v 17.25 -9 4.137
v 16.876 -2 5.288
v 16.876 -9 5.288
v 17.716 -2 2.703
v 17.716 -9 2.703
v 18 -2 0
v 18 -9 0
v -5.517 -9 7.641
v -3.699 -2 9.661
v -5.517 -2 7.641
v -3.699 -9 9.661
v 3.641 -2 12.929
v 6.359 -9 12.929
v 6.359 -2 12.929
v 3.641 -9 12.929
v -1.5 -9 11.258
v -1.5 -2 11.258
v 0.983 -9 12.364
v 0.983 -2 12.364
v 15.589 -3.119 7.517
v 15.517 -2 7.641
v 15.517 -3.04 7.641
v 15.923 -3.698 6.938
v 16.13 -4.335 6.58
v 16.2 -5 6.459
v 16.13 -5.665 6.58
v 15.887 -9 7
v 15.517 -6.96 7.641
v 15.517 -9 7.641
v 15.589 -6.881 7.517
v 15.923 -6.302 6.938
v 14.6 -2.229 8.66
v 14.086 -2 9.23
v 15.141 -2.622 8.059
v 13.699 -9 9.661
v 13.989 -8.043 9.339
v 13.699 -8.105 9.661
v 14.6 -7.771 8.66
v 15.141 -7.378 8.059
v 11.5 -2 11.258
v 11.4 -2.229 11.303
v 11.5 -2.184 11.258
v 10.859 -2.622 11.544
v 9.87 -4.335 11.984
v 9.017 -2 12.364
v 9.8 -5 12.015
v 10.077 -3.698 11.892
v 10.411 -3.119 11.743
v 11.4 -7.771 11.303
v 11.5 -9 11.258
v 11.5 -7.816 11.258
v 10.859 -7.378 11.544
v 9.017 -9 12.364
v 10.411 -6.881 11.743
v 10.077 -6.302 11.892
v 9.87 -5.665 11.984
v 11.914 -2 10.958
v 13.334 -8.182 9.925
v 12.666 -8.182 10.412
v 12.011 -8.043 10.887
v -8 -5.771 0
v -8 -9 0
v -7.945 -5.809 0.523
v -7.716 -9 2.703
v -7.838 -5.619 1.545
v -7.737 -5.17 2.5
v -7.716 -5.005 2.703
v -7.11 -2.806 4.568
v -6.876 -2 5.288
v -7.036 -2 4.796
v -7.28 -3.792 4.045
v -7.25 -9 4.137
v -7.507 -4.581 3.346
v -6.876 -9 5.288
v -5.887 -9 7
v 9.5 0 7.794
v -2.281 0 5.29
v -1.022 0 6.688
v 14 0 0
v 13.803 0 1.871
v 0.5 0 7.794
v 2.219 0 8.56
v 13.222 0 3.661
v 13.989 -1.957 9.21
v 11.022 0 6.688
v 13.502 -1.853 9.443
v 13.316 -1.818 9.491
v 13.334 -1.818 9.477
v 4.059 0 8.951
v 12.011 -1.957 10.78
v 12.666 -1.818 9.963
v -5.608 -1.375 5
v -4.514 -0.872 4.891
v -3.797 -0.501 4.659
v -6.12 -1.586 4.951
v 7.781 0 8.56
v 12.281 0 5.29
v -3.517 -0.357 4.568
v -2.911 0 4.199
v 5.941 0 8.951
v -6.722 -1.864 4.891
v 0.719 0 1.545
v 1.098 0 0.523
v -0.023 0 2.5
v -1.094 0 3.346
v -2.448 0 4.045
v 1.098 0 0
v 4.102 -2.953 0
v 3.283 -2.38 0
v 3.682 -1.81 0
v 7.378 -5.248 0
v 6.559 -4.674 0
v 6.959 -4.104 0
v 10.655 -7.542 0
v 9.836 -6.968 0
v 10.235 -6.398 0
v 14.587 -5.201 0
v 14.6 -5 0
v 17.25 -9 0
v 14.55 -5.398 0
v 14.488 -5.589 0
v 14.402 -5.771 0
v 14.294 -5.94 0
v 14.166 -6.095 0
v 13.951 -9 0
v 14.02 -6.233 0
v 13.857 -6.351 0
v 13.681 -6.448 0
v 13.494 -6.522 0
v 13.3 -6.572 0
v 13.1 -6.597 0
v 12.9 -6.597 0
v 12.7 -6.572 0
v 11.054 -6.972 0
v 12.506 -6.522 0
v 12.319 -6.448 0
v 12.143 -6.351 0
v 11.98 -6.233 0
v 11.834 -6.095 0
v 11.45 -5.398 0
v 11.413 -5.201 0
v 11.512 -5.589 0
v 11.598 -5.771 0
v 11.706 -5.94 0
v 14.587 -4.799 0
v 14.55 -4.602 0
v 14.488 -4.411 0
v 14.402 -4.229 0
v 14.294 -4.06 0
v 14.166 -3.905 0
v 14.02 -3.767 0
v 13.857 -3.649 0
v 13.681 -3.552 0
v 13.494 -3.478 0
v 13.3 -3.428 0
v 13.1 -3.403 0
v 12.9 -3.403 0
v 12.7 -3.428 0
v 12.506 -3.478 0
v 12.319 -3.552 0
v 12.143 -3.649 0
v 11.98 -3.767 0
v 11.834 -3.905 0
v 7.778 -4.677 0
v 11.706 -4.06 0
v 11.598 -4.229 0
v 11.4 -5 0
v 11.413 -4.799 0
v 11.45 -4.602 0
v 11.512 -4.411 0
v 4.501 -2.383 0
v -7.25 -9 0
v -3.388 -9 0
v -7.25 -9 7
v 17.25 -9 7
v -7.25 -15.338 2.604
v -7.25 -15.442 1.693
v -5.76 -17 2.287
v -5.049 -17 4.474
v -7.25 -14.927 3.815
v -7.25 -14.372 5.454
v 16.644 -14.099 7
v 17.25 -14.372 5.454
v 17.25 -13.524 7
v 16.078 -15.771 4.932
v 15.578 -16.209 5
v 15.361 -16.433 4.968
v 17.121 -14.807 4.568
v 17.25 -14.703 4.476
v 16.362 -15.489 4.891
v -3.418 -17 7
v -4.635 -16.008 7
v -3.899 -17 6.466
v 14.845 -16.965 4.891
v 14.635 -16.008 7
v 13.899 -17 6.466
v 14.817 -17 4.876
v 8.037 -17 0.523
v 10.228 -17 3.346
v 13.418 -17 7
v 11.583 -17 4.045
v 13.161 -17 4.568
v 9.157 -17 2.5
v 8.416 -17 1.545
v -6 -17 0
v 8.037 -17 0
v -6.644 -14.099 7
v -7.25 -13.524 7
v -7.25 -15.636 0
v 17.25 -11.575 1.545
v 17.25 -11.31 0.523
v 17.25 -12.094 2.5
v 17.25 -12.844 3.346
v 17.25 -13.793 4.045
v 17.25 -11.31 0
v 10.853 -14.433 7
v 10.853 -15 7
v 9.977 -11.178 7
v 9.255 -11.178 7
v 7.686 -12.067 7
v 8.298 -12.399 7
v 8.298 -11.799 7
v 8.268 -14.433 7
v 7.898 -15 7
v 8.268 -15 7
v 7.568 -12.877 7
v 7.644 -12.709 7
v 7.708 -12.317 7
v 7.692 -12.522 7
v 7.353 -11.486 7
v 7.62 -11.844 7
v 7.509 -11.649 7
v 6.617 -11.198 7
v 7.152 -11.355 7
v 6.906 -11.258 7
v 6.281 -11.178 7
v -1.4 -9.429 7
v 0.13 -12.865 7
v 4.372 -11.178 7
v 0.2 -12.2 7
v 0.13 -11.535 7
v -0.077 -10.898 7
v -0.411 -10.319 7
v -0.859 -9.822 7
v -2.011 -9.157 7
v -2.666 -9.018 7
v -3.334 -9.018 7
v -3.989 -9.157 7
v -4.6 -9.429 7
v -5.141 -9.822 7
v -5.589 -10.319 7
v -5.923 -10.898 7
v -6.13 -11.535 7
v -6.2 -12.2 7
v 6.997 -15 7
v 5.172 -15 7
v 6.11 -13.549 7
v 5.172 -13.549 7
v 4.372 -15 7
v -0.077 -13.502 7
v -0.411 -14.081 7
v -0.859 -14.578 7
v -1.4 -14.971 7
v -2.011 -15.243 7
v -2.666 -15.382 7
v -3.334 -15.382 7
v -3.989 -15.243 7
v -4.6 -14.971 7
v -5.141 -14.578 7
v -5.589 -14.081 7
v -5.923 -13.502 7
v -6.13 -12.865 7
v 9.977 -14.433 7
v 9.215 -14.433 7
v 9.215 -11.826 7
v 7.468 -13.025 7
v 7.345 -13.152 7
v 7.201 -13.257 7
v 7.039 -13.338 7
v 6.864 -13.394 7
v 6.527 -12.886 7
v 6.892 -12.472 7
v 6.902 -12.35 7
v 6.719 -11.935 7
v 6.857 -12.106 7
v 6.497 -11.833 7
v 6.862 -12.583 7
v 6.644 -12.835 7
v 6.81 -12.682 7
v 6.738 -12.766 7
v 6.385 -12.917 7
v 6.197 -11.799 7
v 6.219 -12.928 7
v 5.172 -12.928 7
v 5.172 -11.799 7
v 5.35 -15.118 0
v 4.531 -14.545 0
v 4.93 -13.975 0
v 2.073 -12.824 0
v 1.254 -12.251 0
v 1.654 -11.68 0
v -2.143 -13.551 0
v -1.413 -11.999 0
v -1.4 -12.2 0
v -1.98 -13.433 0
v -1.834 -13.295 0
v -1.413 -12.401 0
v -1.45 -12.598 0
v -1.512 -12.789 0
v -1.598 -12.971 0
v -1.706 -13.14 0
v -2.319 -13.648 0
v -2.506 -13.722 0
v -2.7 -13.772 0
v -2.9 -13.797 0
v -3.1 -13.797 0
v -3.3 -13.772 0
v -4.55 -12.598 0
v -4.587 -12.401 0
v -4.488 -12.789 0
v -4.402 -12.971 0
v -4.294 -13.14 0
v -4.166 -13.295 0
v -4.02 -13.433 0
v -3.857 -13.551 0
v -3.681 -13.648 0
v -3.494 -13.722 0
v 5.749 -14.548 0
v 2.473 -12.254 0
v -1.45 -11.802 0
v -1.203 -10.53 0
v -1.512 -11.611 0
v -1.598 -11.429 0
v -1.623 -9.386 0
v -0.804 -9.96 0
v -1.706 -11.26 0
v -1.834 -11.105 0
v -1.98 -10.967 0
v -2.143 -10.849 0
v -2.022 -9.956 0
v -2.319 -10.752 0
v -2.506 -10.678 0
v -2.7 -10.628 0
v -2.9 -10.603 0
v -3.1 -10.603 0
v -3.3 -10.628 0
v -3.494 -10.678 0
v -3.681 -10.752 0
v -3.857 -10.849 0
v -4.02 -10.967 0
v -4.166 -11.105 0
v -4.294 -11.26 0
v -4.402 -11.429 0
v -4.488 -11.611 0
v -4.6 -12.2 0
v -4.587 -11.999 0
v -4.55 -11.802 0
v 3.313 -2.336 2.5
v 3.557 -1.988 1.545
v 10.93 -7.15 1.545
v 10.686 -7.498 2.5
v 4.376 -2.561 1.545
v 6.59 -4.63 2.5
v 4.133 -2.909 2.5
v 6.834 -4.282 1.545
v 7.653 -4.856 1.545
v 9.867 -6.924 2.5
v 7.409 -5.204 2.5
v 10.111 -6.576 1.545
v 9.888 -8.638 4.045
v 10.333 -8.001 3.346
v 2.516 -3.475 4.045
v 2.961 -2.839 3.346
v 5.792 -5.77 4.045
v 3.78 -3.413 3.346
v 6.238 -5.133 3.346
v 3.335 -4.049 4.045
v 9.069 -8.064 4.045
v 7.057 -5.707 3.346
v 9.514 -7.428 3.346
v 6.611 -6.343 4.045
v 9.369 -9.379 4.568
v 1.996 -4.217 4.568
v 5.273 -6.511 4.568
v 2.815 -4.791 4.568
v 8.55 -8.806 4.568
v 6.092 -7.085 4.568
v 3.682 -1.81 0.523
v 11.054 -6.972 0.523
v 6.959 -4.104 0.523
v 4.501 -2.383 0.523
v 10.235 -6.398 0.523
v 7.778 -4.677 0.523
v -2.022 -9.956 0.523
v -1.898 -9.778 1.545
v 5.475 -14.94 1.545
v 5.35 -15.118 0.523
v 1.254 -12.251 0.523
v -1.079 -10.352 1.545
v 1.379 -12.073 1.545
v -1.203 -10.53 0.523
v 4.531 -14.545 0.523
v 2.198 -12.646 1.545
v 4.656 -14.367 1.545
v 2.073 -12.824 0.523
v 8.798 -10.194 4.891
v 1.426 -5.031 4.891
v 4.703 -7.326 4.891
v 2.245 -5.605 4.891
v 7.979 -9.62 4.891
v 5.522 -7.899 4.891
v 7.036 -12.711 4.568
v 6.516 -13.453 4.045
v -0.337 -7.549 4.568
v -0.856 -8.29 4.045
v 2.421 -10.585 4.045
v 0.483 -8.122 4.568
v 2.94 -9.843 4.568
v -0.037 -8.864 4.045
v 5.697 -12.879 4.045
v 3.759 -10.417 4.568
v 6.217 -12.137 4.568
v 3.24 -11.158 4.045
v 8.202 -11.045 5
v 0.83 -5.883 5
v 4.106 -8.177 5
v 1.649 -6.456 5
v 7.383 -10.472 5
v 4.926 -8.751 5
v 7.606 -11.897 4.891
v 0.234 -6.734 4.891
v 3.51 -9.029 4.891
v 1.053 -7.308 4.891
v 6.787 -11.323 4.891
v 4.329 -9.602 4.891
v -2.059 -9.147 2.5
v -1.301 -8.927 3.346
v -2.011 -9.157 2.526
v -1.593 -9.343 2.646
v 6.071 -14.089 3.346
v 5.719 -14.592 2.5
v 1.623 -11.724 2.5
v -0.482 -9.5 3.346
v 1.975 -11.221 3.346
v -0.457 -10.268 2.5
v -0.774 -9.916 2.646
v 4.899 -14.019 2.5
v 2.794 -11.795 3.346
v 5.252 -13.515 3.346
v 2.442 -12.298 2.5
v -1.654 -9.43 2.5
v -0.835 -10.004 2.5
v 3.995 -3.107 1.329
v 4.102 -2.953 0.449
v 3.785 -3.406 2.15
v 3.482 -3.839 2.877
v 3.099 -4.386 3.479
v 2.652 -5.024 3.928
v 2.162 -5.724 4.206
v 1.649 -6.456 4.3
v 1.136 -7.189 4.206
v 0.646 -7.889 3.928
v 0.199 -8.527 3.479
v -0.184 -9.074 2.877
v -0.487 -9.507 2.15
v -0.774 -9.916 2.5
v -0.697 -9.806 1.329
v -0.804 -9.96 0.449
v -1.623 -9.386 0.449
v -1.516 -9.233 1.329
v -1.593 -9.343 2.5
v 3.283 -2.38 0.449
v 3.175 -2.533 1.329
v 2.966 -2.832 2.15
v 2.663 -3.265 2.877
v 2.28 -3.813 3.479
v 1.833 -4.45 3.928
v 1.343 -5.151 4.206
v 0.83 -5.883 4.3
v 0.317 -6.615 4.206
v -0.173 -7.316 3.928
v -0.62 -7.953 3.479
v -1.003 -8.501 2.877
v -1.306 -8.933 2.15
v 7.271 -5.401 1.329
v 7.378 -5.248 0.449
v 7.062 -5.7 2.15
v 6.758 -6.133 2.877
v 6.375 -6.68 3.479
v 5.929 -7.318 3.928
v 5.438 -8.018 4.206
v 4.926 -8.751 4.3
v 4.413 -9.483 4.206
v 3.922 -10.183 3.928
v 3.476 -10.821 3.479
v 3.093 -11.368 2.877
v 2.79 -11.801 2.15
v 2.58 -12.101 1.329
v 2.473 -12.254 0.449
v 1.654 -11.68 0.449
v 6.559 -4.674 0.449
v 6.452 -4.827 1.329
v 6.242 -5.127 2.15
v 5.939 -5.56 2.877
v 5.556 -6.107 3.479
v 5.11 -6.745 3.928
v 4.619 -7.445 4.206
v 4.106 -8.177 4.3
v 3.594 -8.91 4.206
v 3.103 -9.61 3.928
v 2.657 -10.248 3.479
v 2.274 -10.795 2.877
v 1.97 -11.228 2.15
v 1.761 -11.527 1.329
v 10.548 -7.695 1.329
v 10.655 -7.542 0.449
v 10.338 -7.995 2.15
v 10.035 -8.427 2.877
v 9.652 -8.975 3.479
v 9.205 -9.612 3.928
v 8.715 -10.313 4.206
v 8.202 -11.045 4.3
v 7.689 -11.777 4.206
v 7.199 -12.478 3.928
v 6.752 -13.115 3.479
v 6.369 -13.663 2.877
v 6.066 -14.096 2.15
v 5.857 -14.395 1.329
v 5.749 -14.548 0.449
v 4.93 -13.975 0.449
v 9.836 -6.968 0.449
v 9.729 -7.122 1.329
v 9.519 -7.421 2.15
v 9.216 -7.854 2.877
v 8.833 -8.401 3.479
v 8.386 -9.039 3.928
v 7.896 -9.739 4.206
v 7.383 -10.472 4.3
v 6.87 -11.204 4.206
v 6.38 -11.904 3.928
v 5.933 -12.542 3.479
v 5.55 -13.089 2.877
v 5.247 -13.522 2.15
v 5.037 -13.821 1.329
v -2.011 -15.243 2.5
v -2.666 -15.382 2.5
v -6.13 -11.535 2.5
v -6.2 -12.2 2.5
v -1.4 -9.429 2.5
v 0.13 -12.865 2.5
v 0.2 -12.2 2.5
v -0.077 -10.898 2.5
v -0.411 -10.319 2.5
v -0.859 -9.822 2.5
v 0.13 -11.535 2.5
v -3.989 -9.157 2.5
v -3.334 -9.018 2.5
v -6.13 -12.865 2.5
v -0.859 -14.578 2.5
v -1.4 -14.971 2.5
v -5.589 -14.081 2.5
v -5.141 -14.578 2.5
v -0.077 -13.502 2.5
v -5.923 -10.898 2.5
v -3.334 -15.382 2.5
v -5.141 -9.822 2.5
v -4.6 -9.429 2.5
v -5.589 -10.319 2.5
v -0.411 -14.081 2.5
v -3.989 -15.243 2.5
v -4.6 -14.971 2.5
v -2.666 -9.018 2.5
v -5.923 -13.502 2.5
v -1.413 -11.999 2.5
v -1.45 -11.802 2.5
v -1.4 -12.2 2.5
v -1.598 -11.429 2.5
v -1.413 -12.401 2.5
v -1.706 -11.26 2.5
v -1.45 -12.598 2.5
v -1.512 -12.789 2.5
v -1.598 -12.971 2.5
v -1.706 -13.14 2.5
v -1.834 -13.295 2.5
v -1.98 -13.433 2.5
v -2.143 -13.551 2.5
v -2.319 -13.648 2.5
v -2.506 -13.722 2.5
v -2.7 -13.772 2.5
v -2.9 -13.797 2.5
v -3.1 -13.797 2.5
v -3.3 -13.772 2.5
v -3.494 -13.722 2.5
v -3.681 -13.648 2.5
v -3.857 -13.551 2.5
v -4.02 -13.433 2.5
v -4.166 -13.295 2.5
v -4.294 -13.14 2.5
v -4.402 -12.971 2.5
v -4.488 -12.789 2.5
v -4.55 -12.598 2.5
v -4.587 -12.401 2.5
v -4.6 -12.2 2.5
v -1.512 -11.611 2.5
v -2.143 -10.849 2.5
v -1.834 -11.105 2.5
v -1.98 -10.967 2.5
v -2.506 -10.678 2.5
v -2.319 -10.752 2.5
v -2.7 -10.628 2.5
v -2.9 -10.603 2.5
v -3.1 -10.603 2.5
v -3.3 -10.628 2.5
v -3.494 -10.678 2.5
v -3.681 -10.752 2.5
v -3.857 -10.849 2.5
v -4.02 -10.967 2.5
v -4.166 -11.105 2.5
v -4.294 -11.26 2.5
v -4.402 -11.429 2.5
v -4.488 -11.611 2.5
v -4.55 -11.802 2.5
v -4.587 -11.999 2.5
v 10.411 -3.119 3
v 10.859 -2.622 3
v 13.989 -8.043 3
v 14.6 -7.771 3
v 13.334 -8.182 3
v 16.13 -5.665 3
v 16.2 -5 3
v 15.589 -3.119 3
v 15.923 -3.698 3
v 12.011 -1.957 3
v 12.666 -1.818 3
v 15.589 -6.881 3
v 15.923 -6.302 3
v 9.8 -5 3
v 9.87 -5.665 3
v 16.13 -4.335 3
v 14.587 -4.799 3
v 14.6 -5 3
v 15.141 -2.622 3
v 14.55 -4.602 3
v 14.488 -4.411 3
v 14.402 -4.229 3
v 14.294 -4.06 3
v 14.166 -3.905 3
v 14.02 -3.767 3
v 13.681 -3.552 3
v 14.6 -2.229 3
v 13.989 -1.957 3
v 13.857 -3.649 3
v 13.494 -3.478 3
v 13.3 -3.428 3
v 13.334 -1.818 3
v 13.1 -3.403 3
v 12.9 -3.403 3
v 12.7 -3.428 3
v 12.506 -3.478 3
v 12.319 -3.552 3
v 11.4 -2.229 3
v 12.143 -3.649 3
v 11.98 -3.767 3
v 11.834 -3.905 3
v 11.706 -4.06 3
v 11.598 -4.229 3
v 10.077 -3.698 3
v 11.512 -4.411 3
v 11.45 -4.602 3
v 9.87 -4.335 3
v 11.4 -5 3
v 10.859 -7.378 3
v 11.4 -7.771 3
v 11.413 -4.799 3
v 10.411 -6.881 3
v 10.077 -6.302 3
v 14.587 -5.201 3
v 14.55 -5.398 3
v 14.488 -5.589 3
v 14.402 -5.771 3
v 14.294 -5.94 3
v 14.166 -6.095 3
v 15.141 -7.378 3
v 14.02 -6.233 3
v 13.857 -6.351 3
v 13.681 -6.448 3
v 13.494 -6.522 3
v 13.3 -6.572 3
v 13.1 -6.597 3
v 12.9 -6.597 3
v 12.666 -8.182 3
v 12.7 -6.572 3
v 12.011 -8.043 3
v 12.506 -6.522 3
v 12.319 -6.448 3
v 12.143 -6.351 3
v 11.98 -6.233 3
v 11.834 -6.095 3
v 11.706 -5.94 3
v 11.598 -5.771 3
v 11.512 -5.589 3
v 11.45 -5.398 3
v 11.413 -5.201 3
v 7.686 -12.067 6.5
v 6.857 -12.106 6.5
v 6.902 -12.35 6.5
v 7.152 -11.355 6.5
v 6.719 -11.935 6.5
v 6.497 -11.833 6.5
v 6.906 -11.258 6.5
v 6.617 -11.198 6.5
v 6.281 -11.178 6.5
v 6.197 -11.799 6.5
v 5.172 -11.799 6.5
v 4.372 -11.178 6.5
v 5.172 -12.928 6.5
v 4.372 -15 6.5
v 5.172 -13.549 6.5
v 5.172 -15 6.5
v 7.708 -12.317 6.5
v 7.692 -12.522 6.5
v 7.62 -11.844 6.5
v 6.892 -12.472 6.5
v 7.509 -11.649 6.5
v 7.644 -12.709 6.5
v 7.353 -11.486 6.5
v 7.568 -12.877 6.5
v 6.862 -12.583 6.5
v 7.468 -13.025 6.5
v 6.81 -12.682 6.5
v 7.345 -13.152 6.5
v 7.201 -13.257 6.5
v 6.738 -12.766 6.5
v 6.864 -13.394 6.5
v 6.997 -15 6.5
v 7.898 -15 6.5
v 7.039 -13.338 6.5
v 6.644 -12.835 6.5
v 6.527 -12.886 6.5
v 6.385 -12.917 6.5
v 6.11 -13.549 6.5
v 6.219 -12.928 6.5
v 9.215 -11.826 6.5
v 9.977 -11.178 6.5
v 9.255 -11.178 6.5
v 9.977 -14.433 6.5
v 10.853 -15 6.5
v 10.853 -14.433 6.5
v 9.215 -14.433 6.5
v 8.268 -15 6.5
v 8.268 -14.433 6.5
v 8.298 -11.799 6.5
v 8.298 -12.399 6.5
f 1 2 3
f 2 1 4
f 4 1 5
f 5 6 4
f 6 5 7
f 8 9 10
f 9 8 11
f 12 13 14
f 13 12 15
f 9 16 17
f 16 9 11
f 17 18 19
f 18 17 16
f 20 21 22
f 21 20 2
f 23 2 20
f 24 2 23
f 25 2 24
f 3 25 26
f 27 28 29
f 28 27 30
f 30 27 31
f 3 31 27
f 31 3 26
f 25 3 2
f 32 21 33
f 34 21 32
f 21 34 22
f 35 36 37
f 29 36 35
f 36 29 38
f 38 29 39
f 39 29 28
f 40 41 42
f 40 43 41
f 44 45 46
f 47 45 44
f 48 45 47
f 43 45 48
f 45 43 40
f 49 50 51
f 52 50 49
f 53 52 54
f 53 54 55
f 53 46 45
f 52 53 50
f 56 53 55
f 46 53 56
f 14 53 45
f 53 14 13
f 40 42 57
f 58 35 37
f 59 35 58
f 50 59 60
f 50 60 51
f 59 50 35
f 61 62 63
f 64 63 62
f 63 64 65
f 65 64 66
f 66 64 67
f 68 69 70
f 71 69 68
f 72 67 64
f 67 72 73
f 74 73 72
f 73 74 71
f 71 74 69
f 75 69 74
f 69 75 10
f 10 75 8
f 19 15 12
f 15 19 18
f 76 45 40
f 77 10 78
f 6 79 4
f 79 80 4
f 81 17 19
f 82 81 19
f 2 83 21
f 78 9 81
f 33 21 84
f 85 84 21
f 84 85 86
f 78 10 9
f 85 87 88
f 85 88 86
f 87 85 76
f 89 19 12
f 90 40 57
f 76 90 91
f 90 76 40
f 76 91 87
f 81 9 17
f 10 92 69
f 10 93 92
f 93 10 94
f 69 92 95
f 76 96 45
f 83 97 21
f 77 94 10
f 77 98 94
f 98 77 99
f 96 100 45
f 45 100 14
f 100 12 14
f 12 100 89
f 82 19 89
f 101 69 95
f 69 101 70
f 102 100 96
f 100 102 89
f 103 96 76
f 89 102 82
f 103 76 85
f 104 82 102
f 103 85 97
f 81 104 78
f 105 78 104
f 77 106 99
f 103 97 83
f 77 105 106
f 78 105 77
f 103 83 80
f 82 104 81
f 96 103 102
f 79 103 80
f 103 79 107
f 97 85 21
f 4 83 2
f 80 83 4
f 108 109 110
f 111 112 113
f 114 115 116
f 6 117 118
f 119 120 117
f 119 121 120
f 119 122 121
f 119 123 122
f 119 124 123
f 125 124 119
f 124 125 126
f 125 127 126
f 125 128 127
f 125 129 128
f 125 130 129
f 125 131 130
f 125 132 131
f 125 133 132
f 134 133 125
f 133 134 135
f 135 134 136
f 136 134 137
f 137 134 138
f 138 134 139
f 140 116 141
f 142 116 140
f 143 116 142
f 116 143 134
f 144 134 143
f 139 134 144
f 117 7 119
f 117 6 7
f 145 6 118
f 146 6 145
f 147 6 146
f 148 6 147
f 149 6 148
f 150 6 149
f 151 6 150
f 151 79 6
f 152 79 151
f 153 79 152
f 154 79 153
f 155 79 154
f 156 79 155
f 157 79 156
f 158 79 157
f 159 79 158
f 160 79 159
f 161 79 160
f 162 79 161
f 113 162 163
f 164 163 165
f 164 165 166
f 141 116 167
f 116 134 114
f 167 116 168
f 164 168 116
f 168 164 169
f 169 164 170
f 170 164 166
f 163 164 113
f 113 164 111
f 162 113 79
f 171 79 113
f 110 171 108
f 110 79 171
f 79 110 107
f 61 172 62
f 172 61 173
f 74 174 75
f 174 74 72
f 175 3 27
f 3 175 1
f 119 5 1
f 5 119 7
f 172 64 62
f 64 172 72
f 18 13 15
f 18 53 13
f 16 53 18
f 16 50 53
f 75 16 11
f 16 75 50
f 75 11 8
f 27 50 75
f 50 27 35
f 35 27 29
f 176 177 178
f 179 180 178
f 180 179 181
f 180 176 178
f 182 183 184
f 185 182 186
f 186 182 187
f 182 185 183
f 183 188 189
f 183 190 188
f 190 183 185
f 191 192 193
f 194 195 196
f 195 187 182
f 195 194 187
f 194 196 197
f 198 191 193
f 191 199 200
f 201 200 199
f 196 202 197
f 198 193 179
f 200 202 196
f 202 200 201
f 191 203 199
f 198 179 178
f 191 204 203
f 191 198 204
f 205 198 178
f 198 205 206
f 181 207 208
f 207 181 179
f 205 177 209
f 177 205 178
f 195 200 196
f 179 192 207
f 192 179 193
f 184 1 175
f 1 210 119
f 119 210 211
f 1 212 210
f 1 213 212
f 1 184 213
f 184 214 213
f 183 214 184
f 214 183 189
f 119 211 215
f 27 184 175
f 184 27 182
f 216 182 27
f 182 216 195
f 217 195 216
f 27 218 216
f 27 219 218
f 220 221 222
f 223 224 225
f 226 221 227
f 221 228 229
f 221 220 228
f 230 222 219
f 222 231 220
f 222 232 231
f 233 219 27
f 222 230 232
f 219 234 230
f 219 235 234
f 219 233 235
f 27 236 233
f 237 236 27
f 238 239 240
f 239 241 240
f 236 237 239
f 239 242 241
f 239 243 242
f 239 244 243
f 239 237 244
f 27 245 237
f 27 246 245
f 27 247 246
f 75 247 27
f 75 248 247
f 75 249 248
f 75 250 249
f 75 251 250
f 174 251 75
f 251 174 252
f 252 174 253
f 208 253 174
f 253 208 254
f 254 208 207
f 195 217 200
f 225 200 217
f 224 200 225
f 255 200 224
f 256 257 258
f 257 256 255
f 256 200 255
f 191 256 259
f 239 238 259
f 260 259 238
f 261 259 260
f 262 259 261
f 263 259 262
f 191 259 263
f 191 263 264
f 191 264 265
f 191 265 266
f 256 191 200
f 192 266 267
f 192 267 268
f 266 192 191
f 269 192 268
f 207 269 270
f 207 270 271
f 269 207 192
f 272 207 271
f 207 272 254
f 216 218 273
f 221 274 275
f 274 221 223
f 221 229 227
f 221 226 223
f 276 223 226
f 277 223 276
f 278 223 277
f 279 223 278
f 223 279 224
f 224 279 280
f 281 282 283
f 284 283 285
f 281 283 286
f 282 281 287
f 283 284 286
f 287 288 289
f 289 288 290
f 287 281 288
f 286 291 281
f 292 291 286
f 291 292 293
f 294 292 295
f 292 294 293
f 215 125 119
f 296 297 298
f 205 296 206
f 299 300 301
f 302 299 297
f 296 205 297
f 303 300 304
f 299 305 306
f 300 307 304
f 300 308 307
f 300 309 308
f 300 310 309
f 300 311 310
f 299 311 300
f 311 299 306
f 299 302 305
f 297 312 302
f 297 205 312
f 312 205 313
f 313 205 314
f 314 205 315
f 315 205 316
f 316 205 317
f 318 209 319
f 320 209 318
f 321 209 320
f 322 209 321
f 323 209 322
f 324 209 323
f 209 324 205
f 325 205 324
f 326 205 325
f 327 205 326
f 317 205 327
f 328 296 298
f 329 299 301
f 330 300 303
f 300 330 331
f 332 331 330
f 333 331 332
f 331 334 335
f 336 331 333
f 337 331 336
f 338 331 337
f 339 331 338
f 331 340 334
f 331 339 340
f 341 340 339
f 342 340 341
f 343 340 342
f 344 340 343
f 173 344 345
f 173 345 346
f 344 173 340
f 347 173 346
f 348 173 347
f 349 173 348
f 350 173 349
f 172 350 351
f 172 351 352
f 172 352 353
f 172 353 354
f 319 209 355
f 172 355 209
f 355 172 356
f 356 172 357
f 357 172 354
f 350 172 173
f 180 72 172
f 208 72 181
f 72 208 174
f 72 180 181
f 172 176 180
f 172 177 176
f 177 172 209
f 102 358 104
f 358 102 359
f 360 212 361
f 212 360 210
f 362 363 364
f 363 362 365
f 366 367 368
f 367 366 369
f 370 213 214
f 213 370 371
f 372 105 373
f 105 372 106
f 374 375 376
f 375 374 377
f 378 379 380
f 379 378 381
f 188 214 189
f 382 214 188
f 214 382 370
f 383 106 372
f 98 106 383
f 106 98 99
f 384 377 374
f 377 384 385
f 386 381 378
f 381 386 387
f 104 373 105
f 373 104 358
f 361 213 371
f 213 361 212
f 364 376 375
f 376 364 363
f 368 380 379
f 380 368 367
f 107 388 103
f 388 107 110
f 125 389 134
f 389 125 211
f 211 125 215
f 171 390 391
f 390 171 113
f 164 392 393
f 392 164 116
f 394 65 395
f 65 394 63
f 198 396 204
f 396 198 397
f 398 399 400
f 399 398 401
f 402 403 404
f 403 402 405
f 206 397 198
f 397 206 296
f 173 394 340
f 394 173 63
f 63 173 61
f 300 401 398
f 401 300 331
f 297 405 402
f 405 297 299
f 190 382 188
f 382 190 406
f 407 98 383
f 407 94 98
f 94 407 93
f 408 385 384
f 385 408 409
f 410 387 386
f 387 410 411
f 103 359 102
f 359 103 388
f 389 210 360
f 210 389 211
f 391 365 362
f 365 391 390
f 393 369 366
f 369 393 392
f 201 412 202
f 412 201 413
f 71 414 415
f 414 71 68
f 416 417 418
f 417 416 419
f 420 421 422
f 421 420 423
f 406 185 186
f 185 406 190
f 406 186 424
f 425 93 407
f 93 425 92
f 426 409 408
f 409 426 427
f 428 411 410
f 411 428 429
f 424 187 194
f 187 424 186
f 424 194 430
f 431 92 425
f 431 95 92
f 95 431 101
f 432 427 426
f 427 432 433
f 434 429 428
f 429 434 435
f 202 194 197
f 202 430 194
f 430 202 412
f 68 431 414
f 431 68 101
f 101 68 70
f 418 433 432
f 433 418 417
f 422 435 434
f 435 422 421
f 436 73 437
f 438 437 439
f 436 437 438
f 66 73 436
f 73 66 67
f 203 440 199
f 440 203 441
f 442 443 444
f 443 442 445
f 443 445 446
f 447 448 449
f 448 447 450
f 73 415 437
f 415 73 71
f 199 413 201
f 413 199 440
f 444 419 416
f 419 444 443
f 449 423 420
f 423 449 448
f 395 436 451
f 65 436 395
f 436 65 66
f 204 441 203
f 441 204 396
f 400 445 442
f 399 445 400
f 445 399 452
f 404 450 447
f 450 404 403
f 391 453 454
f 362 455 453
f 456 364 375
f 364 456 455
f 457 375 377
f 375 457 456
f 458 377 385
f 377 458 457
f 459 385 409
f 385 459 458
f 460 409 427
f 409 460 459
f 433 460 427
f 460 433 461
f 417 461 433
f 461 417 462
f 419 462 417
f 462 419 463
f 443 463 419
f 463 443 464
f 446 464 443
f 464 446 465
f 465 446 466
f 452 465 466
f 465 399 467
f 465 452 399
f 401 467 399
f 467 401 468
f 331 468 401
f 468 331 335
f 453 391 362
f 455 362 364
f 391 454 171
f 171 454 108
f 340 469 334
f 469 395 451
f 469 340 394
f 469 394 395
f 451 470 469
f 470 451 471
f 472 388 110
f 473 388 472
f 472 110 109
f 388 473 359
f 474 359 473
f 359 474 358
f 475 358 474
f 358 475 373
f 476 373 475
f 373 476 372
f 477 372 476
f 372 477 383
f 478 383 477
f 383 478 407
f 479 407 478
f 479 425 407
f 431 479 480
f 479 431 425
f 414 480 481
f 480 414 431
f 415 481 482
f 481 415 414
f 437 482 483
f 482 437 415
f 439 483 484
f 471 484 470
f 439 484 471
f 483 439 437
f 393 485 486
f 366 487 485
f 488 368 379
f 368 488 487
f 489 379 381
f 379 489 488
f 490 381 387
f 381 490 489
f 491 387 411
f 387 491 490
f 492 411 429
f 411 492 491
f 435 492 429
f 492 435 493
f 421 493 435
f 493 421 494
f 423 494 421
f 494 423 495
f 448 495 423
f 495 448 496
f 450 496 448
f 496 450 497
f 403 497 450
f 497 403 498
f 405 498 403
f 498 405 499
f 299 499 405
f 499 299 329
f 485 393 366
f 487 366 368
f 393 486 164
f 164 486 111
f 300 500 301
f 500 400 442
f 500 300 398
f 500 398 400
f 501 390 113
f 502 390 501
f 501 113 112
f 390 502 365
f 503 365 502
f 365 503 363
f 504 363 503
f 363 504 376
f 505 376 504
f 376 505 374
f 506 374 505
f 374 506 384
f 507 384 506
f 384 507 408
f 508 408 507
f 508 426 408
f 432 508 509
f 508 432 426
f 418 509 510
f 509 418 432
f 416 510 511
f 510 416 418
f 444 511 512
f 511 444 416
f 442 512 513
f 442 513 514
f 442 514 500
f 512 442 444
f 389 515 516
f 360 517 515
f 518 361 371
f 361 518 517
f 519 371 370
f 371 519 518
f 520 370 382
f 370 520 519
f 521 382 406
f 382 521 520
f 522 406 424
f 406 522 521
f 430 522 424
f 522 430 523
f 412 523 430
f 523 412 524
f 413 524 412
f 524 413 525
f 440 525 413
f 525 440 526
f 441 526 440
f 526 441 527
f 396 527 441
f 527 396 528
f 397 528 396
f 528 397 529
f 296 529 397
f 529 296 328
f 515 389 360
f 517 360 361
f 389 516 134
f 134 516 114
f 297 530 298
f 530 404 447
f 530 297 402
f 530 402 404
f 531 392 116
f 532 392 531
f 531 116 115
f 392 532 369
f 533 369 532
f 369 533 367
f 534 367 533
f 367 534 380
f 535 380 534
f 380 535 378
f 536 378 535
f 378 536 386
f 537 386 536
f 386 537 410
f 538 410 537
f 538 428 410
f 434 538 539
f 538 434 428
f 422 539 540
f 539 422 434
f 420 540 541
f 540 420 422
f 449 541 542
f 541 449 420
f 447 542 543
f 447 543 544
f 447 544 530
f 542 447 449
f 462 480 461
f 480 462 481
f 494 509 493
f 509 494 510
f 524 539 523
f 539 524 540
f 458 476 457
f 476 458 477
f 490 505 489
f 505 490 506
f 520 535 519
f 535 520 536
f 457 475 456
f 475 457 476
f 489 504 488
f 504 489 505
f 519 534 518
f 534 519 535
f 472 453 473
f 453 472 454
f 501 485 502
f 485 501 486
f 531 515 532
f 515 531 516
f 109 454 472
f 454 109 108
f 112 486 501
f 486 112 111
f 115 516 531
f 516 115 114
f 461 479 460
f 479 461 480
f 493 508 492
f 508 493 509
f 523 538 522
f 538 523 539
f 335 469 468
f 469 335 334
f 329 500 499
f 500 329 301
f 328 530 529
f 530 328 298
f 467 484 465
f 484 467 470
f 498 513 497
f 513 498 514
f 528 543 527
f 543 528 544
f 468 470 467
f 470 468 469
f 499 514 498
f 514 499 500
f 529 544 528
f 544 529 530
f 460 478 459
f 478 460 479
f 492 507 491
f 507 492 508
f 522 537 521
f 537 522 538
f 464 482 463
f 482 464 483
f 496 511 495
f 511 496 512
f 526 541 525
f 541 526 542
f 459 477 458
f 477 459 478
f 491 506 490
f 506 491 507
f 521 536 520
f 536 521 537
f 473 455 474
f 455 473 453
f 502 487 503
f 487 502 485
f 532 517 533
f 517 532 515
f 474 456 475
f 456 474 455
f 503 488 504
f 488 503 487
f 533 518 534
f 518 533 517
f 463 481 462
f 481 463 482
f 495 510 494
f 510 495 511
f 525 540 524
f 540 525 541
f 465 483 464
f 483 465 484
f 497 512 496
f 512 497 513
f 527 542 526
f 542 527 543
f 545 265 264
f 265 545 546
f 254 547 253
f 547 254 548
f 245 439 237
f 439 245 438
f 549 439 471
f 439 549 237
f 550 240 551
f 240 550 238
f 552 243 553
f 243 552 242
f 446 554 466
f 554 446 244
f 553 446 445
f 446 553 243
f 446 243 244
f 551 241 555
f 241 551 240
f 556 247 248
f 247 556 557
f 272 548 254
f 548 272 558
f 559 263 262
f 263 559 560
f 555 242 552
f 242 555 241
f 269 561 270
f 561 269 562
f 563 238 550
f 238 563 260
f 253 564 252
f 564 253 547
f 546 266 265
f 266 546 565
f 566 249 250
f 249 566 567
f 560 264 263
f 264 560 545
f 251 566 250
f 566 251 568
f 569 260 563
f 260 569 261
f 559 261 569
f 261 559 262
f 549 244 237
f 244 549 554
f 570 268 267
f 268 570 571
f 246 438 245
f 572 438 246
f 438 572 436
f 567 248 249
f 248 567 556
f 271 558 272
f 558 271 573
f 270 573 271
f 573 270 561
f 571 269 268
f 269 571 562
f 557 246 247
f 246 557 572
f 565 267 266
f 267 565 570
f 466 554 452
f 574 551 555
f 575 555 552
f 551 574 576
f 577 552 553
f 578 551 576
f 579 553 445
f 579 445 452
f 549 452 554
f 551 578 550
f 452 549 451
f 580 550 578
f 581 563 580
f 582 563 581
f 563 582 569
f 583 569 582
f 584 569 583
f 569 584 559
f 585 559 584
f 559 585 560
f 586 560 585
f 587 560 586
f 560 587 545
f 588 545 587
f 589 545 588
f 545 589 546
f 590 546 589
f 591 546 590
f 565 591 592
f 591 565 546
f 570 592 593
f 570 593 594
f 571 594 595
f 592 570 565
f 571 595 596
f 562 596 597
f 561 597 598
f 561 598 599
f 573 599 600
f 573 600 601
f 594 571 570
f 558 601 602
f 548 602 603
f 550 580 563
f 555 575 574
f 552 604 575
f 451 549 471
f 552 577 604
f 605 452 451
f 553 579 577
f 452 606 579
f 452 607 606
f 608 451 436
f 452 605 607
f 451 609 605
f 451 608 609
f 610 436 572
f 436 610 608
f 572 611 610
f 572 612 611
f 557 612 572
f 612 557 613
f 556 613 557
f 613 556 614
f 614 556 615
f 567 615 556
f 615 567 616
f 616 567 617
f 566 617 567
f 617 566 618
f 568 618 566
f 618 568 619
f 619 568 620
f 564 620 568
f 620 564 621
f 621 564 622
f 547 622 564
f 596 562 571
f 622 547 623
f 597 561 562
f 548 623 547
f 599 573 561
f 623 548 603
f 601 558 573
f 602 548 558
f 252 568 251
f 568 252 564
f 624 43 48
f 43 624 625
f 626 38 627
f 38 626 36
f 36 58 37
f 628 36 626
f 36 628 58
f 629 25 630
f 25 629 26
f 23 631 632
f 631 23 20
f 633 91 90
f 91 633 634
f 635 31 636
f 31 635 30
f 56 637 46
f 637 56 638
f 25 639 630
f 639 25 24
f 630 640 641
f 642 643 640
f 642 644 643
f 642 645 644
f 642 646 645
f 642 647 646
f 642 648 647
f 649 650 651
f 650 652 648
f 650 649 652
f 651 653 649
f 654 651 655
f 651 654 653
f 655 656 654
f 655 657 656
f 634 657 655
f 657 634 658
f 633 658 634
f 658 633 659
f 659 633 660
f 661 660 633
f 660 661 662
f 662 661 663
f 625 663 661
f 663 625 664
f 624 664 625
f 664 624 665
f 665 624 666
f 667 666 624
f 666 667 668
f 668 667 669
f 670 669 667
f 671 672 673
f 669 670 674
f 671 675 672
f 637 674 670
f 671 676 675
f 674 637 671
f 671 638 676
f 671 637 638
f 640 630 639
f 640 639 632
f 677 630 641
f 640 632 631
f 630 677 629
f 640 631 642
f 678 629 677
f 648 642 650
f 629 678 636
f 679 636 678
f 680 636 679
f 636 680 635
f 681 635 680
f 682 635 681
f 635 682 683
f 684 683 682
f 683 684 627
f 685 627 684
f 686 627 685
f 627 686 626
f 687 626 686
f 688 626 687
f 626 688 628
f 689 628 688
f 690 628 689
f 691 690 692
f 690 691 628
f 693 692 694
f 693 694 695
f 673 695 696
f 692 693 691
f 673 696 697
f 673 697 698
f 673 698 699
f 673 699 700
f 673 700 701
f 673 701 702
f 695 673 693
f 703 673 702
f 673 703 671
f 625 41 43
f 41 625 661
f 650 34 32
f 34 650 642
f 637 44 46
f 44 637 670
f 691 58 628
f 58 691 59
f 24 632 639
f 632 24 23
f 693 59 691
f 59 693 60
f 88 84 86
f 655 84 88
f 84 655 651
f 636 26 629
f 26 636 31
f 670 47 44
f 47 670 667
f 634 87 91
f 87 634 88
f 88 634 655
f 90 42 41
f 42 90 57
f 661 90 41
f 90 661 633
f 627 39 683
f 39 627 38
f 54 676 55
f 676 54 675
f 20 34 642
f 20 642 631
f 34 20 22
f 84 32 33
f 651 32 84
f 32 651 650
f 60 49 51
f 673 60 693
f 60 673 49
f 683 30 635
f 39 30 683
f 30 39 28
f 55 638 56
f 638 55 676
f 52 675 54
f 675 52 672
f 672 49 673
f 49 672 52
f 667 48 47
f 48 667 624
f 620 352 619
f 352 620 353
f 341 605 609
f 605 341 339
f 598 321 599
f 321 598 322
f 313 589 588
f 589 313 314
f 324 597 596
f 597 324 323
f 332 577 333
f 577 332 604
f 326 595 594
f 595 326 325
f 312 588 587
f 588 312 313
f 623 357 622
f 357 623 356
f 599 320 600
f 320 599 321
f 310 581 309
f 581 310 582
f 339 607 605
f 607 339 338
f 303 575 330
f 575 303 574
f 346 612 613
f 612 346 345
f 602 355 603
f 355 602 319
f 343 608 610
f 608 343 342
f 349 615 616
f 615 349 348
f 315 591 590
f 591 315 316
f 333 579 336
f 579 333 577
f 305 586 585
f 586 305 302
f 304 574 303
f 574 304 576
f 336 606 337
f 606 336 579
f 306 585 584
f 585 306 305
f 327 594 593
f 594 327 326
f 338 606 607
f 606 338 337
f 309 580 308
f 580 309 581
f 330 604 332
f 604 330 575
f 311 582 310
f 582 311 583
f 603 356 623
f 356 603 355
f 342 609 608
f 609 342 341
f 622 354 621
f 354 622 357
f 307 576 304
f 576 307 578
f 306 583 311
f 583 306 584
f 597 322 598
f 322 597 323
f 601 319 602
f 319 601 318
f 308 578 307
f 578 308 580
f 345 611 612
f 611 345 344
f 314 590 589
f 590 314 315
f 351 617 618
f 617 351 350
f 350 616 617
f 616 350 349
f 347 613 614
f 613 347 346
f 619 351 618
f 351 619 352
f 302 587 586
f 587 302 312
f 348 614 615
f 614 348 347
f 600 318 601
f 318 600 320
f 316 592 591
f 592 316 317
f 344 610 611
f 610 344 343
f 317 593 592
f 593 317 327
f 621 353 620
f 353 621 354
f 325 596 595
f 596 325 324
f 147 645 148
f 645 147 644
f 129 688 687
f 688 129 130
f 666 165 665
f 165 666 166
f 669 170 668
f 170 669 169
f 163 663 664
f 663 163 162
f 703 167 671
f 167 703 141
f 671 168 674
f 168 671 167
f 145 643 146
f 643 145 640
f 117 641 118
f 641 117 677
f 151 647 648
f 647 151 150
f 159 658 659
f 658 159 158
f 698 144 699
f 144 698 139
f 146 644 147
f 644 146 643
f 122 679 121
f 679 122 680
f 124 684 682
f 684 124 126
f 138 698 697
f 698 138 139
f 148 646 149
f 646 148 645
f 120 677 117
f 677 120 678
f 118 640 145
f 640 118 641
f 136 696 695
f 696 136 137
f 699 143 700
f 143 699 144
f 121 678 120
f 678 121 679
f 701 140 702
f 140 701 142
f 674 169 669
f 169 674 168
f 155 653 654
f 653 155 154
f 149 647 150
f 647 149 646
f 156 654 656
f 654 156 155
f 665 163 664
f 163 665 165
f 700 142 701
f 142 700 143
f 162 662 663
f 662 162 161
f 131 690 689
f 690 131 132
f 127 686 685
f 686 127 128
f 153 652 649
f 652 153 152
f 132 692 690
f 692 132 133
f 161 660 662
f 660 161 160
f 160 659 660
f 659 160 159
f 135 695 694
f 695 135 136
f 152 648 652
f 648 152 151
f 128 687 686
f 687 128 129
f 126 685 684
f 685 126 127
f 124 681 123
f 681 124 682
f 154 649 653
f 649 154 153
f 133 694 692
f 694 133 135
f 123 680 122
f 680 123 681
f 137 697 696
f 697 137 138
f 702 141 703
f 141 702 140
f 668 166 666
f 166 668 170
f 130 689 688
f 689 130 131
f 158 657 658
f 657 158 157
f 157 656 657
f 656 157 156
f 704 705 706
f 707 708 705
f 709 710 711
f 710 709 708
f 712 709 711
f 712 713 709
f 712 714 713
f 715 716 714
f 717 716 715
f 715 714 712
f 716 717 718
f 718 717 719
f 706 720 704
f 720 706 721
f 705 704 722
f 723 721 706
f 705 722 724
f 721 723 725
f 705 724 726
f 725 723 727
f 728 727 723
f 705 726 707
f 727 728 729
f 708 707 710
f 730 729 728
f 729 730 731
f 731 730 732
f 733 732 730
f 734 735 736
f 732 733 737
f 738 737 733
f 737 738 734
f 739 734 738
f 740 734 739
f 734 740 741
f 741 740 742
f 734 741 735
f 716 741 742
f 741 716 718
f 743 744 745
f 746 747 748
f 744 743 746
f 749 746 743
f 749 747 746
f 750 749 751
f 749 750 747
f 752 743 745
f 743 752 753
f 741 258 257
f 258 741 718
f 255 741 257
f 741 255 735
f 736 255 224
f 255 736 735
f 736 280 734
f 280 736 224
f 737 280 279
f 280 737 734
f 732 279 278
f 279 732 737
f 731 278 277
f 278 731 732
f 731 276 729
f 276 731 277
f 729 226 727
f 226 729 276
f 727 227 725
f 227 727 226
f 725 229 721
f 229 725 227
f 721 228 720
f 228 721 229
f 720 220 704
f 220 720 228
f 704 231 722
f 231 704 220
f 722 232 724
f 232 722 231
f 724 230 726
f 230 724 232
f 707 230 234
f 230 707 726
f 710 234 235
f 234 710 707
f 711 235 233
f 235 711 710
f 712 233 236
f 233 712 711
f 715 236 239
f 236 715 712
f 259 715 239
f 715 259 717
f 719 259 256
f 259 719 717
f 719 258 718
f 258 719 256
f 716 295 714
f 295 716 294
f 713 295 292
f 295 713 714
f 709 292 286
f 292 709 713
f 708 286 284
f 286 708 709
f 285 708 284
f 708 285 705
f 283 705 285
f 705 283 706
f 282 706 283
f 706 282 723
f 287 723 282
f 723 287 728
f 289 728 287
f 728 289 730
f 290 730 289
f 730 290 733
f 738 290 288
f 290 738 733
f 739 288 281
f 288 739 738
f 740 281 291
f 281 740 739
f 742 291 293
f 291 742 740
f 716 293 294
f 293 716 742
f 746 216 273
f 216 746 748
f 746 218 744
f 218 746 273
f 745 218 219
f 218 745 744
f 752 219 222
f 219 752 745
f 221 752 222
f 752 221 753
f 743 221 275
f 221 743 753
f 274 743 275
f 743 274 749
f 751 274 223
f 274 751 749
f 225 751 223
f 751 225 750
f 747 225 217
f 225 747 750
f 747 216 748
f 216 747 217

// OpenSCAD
// PIRANHA iteration1
// LCD cover
// GNU GPL v3
// Usan Siriwardana <usiriwar@uwaterloo.ca> and contributors
// based on Prusa i3 MK3S
// https://reprap.org/wiki/Prusa_i3_MK3


 module heatbed_cable_clip()
{
    
difference()
{    
    
    union()
    {
        difference()
        {
            union()
            {
                // body base
                translate([75,99,28]) rotate([90,0,0]) cylinder( h = 15, r = 13, $fn=30); 
                translate([75,101,28]) rotate([90,0,0]) cylinder( h = 2, r1=9,r2 = 13, $fn=30); 
                
            }

             
           
            
            // cut flat and shape
            translate([60,82,14]) cube([30,20,14]);  
            translate([60,72,20]) cube([30,20,30]); 
        }
         
        
        difference() {
        translate([62.75,84,28]) cube([24.5,8,7]);
        difference () {
        translate([75,85,28]) rotate([90,0,0]) cube([30,20,10], center = true);    
        translate([75,90,28]) rotate([90,0,0]) cylinder(h=6,r1=16.5,r2=11,$fn=30);   
           
        } 
    }}
    
    // cable opening
    translate([61,102,28]) rotate([35,90,0]) difference (){
        cylinder(h=35,r=5,$fn=30);
        
        translate([0,0,12]) cylinder(h=1,r=5,$fn=30); 
        translate([0,0,16]) cylinder(h=1,r=5,$fn=30); 
        translate([0,0,20]) cylinder(h=1,r=5,$fn=30);
    }
    
    translate([61,102,28]) rotate([35,90,0]) cylinder(h=35,r=4.3,$fn=30);
    
  
    
    // screw heads
    translate([67,88.8,30.5]) rotate([0,0,0]) cylinder(h=10,r=3.2,$fn=30); 
    translate([83,96,31]) rotate([0,0,0]) cylinder(h=10,r=3.2,$fn=30); 
    
    
    // screws
            translate([67,88.8,14]) rotate([0,0,0]) cylinder(h=35,r=1.6,$fn=50); 
            translate([83,96,14]) rotate([0,0,0]) cylinder(h=35,r=1.6,$fn=50);
    

    // version
        translate([74,86,34.5]) rotate([0,0,0]) linear_extrude(height = 0.6) 
        { text("R1",font = "helvetica:style=Bold", size=4); }
    
    
    
}



} 

translate([-70, -101, -28]) heatbed_cable_clip();
